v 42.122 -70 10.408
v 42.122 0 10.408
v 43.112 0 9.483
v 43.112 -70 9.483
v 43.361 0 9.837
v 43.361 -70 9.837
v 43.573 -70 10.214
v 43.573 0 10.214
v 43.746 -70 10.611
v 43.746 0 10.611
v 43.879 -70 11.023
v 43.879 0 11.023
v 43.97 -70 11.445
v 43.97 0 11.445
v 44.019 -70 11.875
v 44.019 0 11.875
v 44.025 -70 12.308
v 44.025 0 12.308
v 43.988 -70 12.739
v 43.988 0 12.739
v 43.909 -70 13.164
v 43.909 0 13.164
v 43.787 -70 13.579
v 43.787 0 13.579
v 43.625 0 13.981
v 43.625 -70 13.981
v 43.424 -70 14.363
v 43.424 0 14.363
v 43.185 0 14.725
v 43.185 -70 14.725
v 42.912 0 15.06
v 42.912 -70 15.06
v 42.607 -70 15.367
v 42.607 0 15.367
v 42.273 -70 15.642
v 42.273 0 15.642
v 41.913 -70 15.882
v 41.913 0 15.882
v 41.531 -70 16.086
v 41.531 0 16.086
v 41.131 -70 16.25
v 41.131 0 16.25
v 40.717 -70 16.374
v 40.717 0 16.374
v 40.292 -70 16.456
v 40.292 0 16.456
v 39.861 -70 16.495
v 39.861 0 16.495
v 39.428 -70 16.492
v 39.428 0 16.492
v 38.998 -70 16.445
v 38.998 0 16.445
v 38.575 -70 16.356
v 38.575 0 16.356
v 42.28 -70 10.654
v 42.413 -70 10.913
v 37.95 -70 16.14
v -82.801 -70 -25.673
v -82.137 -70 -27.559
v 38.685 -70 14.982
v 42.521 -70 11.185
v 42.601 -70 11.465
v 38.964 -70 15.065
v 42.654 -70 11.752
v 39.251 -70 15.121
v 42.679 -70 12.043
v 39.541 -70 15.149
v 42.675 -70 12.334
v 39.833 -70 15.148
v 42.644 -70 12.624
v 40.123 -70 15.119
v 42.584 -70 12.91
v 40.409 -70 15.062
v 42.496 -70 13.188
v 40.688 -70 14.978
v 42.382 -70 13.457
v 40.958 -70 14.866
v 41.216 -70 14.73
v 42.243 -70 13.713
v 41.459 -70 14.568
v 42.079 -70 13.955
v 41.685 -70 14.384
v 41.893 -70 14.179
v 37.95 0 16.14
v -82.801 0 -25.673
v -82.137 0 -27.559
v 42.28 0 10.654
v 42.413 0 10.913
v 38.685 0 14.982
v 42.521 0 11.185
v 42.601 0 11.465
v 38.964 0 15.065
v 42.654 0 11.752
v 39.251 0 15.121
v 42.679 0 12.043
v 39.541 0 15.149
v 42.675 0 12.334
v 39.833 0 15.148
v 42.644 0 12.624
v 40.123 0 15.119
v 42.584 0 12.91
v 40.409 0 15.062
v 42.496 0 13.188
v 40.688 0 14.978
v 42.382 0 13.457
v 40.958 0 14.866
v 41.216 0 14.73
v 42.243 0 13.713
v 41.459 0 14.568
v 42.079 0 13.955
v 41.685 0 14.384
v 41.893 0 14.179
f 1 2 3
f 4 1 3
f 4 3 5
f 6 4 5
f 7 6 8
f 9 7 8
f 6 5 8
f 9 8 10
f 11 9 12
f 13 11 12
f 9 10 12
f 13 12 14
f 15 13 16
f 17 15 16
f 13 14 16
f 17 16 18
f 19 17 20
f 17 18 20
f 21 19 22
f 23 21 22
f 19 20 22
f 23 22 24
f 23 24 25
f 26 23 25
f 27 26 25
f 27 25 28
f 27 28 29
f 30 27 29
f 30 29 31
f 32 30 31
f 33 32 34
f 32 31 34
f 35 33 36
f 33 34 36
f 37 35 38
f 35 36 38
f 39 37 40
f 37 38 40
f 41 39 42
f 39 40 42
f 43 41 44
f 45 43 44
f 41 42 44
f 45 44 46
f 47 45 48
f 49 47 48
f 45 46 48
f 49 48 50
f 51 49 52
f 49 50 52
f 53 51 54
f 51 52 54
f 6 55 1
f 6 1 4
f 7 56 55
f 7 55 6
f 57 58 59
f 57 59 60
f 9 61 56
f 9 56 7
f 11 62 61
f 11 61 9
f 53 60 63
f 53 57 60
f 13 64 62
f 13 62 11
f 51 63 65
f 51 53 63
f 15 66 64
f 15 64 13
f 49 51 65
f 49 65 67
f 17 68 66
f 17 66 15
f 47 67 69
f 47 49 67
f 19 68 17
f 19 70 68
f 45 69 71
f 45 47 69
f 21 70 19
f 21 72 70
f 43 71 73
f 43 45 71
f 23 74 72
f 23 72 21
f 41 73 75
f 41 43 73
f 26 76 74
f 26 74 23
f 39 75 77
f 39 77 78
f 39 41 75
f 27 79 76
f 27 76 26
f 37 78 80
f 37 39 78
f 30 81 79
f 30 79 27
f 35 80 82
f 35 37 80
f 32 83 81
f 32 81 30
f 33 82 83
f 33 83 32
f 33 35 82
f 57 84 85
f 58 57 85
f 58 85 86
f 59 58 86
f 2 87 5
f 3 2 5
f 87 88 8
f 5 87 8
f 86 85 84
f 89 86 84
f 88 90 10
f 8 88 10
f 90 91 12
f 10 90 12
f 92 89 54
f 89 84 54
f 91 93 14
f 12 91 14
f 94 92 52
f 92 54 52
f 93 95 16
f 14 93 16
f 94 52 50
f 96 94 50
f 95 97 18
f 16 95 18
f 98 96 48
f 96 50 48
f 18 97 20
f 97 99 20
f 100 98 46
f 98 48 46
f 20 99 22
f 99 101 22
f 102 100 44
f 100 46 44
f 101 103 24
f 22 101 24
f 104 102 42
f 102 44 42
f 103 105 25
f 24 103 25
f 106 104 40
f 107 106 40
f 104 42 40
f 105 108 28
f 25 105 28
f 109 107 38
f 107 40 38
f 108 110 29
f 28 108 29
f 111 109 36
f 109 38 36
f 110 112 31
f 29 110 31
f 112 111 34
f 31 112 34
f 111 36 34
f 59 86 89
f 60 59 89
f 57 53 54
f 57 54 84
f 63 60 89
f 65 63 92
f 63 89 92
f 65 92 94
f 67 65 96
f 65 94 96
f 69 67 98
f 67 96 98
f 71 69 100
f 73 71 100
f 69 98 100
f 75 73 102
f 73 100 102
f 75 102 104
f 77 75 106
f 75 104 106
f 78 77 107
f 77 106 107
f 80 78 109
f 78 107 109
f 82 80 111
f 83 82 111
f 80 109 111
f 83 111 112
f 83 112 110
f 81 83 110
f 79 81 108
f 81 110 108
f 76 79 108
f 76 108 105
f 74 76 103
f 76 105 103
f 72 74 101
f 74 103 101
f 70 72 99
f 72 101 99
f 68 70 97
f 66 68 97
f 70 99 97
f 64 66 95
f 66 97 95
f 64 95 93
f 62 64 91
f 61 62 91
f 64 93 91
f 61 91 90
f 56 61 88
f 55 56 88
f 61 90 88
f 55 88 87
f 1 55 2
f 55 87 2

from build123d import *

# Parameters (mm, degrees)
F1_DEPTH = 70


with BuildPart() as f1:
    # F0 (on Front) → F1 (new body)
    with BuildSketch(Plane.XZ):
        with BuildLine():
            ThreePointArc((38.684679, 14.981631), (42.07904, 13.954538), (42.122397, 10.408452))
            Line((42.122397, 10.408452), (43.112431, 9.482922))
            ThreePointArc((43.112431, 9.482922), (43.308922, 14.546989), (38.574926, 16.356039))
            Line((38.574926, 16.356039), (37.950457, 16.139805))
            Line((37.950457, 16.139805), (-82.800867, -25.672631))
            Line((-82.800867, -25.672631), (-82.136644, -27.559111))
            Line((-82.136644, -27.559111), (38.684679, 14.981631))
        make_face()
    extrude(amount=F1_DEPTH)


solid = f1.part
